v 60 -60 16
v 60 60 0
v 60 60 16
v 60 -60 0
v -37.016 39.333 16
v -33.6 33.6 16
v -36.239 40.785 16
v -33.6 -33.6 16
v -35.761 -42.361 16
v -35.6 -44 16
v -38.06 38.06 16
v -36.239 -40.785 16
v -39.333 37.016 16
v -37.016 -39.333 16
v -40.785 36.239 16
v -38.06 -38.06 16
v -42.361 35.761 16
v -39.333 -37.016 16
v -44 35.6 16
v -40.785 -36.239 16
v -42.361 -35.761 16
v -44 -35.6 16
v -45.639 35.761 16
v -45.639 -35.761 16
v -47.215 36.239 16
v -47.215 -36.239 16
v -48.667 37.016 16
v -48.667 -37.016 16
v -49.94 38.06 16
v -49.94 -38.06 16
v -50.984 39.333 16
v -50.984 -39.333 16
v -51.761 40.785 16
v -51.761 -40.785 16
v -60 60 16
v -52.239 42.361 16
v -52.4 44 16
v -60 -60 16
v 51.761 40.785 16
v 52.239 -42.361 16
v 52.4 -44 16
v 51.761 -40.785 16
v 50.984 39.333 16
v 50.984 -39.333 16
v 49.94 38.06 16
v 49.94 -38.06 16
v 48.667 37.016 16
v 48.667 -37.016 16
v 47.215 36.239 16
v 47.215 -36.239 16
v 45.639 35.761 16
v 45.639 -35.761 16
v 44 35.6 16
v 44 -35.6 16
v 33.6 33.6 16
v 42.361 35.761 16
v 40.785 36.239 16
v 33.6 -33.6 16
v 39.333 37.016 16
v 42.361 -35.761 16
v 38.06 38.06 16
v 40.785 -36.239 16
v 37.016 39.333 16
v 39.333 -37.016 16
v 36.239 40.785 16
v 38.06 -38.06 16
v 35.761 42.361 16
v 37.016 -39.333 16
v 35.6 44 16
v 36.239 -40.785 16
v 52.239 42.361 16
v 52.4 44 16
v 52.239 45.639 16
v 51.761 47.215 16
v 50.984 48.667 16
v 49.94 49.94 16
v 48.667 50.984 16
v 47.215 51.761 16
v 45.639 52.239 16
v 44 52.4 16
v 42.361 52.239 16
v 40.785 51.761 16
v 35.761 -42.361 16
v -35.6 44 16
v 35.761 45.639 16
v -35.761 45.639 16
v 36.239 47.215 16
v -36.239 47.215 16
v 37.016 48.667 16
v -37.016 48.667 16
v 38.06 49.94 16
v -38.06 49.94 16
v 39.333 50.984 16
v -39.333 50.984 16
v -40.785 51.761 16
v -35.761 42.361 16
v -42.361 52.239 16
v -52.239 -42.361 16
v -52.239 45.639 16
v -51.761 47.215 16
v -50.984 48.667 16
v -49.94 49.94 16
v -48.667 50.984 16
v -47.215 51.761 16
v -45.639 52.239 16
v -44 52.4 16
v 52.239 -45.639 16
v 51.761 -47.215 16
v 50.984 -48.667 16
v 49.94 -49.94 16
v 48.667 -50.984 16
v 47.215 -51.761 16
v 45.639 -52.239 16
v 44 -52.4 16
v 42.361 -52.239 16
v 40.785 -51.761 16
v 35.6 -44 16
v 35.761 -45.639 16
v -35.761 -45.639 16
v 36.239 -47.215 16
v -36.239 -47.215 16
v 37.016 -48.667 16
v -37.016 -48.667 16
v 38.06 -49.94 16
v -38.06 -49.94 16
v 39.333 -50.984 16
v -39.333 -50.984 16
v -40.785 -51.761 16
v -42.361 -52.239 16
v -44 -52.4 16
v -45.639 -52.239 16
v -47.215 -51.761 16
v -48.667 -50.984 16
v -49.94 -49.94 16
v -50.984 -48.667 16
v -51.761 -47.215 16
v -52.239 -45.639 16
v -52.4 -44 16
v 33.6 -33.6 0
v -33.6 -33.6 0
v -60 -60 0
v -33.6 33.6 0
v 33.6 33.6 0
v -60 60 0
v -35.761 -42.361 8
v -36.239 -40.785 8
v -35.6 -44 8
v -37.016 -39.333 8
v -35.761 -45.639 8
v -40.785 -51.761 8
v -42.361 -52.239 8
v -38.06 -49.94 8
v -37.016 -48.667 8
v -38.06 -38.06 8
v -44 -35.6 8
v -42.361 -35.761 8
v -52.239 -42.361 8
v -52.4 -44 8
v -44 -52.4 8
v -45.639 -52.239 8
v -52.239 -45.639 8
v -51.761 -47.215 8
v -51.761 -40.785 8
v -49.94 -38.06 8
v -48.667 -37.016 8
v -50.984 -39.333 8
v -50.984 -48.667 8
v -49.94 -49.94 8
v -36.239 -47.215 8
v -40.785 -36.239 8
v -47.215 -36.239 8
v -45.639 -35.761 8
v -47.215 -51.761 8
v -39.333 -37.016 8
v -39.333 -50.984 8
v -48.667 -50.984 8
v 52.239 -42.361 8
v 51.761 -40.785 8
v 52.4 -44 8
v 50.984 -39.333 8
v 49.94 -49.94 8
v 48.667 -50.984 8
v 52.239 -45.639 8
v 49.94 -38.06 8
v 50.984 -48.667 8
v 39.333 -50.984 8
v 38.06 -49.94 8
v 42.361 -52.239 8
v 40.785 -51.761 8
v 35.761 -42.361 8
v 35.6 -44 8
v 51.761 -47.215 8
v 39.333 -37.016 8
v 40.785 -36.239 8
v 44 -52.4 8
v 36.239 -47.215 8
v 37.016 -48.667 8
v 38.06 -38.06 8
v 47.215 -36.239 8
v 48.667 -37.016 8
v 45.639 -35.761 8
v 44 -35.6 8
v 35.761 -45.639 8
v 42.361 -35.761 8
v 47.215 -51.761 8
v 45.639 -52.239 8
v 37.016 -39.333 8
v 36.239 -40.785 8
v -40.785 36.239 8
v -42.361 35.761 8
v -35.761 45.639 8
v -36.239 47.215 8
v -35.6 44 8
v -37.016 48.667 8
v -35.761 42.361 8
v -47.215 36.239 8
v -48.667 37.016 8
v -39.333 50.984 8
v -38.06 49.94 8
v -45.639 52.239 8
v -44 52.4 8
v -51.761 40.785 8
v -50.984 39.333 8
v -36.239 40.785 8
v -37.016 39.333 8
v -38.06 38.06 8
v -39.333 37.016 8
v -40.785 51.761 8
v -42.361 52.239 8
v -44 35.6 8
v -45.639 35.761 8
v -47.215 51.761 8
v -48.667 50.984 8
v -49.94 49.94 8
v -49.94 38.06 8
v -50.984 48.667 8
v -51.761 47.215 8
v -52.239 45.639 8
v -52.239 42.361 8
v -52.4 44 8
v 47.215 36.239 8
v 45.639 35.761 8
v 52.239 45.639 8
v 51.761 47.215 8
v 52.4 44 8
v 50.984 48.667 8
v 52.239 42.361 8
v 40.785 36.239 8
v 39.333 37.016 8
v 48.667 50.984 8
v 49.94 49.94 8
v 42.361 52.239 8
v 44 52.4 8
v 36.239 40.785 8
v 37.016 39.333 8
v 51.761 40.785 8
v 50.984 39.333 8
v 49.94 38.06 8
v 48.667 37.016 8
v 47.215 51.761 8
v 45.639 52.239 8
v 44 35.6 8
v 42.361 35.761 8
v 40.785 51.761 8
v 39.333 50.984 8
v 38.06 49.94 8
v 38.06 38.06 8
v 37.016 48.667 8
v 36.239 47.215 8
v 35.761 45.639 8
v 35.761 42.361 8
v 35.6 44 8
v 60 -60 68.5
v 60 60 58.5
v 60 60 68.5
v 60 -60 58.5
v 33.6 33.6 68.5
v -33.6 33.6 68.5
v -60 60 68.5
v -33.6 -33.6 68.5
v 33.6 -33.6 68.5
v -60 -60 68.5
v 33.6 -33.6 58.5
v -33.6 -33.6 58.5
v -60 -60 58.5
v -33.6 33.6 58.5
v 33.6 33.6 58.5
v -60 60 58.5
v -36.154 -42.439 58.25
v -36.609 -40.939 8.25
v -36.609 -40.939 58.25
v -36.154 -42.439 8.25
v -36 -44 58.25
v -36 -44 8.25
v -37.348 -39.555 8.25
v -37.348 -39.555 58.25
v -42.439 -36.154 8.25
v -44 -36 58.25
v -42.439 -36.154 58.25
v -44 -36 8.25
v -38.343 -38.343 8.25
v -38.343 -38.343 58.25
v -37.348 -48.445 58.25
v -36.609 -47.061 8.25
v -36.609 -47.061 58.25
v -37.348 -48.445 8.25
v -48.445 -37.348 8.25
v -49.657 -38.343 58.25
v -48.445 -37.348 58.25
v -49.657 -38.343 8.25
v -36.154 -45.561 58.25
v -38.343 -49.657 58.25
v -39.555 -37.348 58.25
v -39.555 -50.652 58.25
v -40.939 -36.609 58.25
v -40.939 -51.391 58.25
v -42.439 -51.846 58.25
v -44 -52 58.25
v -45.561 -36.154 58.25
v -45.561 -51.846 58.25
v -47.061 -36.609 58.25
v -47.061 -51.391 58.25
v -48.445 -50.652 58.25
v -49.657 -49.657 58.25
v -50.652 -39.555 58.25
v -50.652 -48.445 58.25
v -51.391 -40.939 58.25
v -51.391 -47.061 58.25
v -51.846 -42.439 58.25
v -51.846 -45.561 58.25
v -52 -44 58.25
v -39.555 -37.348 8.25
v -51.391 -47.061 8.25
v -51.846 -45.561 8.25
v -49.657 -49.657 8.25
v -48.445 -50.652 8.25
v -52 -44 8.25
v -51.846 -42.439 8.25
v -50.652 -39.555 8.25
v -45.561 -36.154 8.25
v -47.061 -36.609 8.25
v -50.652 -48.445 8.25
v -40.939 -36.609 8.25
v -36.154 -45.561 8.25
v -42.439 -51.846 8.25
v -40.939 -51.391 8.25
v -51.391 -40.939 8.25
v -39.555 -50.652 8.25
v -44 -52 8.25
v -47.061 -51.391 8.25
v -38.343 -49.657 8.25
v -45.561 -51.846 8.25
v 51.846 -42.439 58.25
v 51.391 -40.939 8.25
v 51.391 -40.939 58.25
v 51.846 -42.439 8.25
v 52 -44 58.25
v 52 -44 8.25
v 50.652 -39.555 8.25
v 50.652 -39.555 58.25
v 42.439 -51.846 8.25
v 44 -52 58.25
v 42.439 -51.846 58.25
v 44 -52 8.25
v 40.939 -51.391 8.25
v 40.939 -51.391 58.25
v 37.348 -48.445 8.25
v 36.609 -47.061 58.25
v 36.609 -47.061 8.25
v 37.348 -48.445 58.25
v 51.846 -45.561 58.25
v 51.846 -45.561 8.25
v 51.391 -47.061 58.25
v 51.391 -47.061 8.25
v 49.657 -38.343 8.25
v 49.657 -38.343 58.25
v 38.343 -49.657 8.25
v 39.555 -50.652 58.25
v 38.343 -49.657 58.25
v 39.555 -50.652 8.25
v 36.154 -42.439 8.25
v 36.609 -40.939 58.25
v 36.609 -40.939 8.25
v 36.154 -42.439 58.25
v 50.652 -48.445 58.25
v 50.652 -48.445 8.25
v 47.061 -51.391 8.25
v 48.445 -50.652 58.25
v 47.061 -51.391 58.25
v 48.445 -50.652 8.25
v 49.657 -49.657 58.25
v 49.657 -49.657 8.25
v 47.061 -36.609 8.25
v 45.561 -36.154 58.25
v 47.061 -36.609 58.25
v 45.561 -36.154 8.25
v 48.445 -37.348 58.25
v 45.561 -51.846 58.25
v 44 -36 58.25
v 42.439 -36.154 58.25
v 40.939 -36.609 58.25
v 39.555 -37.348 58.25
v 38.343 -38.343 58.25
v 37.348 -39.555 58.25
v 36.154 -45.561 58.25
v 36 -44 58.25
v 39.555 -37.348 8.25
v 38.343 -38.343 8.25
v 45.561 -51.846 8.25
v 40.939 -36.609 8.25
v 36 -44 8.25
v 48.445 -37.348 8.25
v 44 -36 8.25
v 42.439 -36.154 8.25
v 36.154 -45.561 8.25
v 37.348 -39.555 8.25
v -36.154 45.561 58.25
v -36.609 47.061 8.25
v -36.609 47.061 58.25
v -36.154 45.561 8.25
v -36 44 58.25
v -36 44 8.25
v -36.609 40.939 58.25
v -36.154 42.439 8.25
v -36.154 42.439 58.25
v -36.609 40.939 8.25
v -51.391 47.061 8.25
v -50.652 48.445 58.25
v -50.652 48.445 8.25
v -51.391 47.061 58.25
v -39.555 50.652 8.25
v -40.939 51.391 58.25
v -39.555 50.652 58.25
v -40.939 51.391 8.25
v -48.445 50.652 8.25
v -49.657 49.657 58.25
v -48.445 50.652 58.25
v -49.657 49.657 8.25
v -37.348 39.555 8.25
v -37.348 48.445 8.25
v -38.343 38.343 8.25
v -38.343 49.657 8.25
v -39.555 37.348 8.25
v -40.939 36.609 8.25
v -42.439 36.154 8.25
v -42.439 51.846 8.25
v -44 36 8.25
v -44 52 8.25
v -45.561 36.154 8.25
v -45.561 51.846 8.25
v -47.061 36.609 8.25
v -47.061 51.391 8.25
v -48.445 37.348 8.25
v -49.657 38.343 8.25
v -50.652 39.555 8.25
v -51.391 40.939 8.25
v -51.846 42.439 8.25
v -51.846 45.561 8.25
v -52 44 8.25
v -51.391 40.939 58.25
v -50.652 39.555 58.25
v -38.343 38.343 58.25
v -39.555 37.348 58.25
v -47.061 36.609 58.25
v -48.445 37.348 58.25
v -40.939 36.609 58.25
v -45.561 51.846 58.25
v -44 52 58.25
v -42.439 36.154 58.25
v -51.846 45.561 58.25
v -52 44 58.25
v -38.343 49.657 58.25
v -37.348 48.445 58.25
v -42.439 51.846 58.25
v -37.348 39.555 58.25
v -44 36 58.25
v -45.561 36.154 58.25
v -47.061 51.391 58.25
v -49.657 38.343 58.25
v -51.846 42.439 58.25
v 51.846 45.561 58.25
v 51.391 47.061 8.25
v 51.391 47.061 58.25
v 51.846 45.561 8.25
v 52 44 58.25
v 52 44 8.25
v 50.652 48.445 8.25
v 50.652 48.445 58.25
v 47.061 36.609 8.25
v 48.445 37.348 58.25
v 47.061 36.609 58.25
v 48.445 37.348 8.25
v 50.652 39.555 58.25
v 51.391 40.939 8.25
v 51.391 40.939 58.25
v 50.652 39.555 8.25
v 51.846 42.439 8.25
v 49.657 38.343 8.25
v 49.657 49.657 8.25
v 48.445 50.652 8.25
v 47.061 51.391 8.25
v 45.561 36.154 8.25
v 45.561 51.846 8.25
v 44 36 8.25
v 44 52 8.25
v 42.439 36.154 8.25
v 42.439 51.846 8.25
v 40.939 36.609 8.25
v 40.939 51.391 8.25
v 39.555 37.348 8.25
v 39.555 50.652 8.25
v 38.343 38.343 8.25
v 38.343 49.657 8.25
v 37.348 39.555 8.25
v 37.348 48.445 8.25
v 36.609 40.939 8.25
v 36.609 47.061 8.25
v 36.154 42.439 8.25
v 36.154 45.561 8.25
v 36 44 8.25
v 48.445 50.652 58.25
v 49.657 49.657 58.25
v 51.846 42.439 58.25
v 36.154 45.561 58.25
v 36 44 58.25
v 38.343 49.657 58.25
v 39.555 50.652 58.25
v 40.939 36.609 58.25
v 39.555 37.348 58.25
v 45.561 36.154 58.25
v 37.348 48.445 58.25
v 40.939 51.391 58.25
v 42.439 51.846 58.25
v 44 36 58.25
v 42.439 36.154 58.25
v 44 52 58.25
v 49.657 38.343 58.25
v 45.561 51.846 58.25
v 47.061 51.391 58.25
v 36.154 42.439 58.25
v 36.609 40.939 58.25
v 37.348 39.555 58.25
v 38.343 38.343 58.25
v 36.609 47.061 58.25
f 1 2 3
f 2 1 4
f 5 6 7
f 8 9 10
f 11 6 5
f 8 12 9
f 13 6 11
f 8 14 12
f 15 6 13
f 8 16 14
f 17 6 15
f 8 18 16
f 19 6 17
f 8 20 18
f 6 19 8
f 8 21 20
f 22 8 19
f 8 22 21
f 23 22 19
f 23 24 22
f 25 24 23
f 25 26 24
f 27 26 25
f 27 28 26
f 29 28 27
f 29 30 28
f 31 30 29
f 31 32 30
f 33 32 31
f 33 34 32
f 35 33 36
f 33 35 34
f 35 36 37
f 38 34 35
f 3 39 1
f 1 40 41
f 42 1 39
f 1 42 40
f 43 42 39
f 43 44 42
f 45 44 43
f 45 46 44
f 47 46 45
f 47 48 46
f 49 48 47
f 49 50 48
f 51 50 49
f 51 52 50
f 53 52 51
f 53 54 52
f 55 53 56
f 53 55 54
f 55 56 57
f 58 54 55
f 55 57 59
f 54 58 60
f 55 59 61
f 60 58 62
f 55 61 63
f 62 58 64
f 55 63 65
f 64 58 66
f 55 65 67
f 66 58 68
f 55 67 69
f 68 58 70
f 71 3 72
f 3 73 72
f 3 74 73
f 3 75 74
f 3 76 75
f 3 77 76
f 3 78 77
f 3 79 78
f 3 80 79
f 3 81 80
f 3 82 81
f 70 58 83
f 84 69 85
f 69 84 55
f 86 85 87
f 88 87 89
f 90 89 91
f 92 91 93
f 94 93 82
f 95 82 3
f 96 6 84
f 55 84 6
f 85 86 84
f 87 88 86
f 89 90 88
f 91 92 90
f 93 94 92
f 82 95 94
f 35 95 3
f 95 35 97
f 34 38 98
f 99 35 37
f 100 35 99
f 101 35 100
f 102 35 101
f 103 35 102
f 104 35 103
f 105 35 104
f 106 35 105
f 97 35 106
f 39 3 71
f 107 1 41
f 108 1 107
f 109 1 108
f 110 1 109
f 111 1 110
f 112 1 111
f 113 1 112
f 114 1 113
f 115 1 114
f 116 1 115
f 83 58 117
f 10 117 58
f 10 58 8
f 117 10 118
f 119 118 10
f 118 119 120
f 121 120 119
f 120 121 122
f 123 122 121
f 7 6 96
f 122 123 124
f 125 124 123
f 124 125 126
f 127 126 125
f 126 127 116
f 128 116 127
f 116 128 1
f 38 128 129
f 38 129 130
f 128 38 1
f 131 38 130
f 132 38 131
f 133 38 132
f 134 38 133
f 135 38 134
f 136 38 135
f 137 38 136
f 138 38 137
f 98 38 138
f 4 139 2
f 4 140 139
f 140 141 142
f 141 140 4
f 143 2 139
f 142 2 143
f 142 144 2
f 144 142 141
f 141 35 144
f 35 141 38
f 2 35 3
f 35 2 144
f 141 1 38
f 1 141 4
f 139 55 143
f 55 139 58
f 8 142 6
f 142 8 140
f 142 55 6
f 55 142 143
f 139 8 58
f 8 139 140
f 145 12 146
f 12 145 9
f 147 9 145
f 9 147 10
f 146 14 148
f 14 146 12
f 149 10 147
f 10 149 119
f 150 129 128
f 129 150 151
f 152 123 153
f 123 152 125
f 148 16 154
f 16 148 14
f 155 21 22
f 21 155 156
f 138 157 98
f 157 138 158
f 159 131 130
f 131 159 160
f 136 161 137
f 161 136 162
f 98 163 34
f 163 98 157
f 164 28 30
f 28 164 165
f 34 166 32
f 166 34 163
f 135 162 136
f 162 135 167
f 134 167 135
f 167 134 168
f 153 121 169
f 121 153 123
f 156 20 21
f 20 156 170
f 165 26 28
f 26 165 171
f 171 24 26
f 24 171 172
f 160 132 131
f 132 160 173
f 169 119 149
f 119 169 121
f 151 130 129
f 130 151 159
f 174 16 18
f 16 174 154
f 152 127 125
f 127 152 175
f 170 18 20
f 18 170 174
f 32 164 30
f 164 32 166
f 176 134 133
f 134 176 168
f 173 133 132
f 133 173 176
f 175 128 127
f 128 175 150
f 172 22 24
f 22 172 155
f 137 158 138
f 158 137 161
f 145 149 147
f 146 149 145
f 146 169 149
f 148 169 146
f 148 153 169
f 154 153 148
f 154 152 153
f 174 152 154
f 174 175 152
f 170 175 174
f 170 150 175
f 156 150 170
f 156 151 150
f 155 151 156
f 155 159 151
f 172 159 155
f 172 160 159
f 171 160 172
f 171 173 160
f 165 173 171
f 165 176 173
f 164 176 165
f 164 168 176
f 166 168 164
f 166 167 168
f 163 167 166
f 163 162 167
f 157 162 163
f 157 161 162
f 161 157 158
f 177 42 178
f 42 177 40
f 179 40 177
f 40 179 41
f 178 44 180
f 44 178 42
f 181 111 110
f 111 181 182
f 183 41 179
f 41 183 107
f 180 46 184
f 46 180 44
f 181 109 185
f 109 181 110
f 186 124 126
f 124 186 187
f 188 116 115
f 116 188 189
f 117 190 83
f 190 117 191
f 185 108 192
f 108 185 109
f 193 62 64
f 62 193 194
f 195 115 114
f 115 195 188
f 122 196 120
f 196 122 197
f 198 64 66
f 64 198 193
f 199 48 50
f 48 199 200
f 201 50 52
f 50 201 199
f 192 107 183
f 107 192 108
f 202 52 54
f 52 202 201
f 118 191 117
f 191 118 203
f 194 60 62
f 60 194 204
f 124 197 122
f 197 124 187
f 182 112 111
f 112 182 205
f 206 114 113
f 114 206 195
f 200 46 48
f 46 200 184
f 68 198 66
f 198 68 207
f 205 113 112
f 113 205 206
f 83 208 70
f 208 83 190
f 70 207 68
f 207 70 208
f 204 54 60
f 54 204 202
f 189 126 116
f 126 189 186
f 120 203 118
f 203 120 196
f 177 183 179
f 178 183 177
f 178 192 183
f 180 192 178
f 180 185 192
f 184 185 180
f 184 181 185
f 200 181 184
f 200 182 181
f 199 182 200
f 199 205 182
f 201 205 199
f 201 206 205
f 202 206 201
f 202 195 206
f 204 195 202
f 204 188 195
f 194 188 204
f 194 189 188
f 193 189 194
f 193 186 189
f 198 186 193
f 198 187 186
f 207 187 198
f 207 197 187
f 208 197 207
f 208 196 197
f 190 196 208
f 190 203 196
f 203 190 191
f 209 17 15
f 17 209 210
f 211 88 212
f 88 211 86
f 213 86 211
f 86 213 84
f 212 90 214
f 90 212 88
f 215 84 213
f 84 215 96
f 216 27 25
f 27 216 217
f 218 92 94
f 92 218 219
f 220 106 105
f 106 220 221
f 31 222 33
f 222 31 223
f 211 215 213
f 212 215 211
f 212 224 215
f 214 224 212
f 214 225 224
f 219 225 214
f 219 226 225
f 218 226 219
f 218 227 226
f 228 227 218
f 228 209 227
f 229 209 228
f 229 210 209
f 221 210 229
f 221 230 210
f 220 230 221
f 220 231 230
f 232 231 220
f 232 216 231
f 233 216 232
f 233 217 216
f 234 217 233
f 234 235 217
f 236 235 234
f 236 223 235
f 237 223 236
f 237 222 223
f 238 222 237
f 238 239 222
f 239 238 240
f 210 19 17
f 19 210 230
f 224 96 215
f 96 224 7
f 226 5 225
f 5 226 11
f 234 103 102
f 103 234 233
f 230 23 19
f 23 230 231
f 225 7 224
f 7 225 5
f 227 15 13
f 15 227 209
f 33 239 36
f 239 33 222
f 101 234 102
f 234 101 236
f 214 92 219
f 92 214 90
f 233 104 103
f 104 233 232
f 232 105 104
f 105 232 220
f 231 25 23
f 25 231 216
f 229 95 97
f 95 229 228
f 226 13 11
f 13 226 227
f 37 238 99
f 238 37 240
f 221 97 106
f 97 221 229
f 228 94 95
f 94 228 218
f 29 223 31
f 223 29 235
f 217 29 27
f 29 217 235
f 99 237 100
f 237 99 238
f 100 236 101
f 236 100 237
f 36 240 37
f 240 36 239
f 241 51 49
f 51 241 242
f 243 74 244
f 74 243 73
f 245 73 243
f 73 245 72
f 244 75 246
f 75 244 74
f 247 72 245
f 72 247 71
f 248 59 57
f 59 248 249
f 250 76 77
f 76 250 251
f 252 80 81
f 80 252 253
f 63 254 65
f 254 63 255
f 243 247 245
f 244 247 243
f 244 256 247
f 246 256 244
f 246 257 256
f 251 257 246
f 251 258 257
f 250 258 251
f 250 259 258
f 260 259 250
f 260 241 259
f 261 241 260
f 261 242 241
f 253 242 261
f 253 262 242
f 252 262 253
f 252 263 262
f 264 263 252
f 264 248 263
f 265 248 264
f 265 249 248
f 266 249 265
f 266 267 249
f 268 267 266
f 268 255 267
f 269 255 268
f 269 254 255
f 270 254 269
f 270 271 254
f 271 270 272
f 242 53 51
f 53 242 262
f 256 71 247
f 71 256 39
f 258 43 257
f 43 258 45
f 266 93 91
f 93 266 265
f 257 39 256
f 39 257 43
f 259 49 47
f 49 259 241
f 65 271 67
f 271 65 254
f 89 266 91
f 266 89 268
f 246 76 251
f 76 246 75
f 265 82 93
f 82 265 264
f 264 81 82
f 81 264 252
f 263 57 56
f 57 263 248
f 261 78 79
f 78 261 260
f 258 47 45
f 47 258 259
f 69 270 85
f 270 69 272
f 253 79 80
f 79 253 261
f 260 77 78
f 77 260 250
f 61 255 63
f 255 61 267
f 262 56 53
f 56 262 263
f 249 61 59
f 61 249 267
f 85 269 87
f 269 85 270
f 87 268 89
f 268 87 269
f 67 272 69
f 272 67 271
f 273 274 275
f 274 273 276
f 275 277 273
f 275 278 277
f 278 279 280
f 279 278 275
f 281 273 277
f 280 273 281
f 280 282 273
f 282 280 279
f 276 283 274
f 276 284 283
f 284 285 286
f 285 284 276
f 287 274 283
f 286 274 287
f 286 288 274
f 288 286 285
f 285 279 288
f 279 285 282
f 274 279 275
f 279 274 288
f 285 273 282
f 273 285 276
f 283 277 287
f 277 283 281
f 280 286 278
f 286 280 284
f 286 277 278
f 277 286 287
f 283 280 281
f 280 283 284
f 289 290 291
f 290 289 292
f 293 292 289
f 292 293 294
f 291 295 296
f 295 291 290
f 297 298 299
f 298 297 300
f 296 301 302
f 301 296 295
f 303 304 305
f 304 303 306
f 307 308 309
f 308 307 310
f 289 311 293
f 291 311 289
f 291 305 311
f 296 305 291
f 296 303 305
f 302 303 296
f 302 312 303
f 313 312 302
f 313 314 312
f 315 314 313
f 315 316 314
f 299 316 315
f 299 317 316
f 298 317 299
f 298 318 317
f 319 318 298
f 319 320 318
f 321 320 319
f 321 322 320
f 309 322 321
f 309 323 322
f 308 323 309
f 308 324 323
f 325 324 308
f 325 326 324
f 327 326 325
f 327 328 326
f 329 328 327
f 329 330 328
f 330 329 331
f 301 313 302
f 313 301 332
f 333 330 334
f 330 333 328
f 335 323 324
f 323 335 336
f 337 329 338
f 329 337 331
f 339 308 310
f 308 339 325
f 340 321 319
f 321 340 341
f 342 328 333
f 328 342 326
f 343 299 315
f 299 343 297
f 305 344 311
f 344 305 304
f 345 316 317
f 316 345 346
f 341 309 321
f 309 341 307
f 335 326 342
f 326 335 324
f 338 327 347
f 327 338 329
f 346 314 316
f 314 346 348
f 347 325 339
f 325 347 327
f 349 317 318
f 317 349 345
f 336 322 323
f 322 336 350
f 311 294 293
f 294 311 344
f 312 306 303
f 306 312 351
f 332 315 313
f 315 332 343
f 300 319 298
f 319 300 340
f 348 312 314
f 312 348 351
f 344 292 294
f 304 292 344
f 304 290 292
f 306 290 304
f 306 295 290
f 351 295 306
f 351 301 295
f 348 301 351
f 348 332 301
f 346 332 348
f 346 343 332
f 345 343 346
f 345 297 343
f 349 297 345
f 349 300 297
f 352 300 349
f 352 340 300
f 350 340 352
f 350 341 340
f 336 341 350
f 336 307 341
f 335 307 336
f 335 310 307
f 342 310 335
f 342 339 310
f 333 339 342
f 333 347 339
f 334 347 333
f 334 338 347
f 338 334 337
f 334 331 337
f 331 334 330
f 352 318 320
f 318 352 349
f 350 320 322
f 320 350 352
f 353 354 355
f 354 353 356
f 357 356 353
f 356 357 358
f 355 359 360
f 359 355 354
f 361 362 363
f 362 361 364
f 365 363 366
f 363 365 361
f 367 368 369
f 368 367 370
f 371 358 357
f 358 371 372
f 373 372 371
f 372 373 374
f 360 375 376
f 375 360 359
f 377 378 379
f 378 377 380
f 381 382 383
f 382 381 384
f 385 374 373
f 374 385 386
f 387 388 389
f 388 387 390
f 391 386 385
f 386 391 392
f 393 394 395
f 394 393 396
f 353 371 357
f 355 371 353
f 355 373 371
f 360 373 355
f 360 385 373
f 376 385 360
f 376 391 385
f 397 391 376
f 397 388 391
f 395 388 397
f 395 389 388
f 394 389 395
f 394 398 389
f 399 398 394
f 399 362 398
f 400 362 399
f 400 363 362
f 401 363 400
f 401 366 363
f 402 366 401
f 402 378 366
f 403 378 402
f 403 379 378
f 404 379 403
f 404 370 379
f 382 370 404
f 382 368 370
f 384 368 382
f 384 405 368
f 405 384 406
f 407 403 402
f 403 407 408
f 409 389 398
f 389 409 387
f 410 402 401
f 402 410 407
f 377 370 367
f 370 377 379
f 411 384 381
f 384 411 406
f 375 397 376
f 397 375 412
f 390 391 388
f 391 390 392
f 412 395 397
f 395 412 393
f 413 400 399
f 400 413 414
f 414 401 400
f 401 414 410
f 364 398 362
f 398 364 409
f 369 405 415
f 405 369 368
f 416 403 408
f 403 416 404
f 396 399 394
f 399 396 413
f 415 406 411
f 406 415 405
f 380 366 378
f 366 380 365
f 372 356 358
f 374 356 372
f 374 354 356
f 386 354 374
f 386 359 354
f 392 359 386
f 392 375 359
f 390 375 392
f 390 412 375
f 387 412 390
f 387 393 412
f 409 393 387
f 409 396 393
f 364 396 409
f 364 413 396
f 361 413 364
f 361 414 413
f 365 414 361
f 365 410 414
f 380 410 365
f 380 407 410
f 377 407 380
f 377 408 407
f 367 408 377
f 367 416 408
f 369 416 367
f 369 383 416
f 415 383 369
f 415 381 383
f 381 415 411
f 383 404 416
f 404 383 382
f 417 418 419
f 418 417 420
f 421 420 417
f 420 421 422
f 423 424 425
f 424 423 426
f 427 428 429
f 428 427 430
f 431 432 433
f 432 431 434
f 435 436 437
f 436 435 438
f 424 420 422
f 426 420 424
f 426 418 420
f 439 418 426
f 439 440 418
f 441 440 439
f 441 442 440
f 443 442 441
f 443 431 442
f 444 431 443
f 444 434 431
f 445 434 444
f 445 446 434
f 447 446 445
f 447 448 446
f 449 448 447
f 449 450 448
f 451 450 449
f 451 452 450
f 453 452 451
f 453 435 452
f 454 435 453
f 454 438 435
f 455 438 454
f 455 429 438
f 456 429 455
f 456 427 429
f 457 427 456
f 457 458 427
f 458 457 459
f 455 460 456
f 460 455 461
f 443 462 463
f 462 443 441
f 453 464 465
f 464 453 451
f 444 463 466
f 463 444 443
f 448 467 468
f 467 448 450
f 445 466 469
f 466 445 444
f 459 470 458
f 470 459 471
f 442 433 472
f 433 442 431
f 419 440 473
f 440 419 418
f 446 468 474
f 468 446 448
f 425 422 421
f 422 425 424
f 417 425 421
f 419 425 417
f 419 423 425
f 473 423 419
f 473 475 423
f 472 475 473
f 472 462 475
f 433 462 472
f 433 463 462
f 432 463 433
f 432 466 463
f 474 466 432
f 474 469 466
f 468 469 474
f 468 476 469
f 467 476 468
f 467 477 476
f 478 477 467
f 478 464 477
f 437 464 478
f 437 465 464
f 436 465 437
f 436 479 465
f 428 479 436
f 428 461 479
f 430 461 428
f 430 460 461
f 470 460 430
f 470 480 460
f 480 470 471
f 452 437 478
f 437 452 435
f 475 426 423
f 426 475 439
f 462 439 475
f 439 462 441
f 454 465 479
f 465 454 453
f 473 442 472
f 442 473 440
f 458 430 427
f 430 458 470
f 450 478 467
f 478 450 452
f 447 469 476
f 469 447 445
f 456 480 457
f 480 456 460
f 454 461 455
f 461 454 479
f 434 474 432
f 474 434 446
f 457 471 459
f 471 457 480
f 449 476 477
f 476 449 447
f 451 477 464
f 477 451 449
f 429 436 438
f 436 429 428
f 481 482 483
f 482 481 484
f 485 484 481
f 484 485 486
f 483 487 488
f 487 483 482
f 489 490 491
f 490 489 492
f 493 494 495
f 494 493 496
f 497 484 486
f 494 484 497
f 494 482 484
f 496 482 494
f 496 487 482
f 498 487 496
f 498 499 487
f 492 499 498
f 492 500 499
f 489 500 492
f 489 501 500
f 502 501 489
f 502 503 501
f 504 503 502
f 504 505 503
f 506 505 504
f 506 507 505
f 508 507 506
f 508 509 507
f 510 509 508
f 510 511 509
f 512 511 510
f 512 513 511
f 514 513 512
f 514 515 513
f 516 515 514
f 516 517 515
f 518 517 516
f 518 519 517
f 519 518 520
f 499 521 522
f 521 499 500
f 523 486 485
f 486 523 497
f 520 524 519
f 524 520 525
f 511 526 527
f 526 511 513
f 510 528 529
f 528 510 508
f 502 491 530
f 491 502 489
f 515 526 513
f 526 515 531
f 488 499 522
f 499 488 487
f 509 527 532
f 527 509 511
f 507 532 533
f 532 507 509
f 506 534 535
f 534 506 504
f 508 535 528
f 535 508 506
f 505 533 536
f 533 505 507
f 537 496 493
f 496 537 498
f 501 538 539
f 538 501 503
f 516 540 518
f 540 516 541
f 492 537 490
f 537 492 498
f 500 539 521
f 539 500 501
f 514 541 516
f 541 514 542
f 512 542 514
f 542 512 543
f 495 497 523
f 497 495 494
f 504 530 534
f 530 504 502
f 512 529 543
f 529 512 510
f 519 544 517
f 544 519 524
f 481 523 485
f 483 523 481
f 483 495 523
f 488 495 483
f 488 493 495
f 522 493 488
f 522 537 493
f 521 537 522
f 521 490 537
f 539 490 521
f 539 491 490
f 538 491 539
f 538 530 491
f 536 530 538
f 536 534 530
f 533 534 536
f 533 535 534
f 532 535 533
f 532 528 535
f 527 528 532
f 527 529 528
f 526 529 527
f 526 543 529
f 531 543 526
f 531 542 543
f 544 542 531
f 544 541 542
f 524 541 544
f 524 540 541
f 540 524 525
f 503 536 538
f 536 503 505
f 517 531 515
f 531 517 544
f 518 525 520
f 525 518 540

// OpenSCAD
$fn = 32;

// ------------------------------------------------------------------------
// Frame cube: base 120 x 120 mm, posts 50 mm tall
// Every part is its own module, assembly() places every instance.
// ------------------------------------------------------------------------

// --- part 1 ---
module base_frame() {
  difference() {
    translate([-60, -60, 0]) cube([120, 120, 16]);
    translate([-33.6, -33.6, -1]) cube([67.2, 67.2, 18]);
    translate([-44, -44, 8]) cylinder(h = 9, d = 16.8);
    translate([44, -44, 8]) cylinder(h = 9, d = 16.8);
    translate([-44, 44, 8]) cylinder(h = 9, d = 16.8);
    translate([44, 44, 8]) cylinder(h = 9, d = 16.8);
  }
}

// --- part 2 ---
module corner_post() {
  cylinder(h = 50, d = 16);
}

// --- part 3 ---
module top_frame() {
  difference() {
    translate([-60, -60, 0]) cube([120, 120, 10]);
    translate([-33.6, -33.6, -1]) cube([67.2, 67.2, 12]);
  }
}

// --- assembly ---
module assembly() {
  color([0.80, 0.24, 0.20]) translate([0, 0, 0]) rotate([0, 0, 0]) base_frame();
  color([0.20, 0.45, 0.75]) translate([-44, -44, 8.25]) rotate([0, 0, 0]) corner_post();
  color([0.25, 0.62, 0.32]) translate([44, -44, 8.25]) rotate([0, 0, 0]) corner_post();
  color([0.92, 0.70, 0.18]) translate([-44, 44, 8.25]) rotate([0, 0, 0]) corner_post();
  color([0.58, 0.35, 0.70]) translate([44, 44, 8.25]) rotate([0, 0, 0]) corner_post();
  color([0.16, 0.66, 0.66]) translate([0, 0, 58.5]) rotate([0, 0, 0]) top_frame();
}

assembly();
